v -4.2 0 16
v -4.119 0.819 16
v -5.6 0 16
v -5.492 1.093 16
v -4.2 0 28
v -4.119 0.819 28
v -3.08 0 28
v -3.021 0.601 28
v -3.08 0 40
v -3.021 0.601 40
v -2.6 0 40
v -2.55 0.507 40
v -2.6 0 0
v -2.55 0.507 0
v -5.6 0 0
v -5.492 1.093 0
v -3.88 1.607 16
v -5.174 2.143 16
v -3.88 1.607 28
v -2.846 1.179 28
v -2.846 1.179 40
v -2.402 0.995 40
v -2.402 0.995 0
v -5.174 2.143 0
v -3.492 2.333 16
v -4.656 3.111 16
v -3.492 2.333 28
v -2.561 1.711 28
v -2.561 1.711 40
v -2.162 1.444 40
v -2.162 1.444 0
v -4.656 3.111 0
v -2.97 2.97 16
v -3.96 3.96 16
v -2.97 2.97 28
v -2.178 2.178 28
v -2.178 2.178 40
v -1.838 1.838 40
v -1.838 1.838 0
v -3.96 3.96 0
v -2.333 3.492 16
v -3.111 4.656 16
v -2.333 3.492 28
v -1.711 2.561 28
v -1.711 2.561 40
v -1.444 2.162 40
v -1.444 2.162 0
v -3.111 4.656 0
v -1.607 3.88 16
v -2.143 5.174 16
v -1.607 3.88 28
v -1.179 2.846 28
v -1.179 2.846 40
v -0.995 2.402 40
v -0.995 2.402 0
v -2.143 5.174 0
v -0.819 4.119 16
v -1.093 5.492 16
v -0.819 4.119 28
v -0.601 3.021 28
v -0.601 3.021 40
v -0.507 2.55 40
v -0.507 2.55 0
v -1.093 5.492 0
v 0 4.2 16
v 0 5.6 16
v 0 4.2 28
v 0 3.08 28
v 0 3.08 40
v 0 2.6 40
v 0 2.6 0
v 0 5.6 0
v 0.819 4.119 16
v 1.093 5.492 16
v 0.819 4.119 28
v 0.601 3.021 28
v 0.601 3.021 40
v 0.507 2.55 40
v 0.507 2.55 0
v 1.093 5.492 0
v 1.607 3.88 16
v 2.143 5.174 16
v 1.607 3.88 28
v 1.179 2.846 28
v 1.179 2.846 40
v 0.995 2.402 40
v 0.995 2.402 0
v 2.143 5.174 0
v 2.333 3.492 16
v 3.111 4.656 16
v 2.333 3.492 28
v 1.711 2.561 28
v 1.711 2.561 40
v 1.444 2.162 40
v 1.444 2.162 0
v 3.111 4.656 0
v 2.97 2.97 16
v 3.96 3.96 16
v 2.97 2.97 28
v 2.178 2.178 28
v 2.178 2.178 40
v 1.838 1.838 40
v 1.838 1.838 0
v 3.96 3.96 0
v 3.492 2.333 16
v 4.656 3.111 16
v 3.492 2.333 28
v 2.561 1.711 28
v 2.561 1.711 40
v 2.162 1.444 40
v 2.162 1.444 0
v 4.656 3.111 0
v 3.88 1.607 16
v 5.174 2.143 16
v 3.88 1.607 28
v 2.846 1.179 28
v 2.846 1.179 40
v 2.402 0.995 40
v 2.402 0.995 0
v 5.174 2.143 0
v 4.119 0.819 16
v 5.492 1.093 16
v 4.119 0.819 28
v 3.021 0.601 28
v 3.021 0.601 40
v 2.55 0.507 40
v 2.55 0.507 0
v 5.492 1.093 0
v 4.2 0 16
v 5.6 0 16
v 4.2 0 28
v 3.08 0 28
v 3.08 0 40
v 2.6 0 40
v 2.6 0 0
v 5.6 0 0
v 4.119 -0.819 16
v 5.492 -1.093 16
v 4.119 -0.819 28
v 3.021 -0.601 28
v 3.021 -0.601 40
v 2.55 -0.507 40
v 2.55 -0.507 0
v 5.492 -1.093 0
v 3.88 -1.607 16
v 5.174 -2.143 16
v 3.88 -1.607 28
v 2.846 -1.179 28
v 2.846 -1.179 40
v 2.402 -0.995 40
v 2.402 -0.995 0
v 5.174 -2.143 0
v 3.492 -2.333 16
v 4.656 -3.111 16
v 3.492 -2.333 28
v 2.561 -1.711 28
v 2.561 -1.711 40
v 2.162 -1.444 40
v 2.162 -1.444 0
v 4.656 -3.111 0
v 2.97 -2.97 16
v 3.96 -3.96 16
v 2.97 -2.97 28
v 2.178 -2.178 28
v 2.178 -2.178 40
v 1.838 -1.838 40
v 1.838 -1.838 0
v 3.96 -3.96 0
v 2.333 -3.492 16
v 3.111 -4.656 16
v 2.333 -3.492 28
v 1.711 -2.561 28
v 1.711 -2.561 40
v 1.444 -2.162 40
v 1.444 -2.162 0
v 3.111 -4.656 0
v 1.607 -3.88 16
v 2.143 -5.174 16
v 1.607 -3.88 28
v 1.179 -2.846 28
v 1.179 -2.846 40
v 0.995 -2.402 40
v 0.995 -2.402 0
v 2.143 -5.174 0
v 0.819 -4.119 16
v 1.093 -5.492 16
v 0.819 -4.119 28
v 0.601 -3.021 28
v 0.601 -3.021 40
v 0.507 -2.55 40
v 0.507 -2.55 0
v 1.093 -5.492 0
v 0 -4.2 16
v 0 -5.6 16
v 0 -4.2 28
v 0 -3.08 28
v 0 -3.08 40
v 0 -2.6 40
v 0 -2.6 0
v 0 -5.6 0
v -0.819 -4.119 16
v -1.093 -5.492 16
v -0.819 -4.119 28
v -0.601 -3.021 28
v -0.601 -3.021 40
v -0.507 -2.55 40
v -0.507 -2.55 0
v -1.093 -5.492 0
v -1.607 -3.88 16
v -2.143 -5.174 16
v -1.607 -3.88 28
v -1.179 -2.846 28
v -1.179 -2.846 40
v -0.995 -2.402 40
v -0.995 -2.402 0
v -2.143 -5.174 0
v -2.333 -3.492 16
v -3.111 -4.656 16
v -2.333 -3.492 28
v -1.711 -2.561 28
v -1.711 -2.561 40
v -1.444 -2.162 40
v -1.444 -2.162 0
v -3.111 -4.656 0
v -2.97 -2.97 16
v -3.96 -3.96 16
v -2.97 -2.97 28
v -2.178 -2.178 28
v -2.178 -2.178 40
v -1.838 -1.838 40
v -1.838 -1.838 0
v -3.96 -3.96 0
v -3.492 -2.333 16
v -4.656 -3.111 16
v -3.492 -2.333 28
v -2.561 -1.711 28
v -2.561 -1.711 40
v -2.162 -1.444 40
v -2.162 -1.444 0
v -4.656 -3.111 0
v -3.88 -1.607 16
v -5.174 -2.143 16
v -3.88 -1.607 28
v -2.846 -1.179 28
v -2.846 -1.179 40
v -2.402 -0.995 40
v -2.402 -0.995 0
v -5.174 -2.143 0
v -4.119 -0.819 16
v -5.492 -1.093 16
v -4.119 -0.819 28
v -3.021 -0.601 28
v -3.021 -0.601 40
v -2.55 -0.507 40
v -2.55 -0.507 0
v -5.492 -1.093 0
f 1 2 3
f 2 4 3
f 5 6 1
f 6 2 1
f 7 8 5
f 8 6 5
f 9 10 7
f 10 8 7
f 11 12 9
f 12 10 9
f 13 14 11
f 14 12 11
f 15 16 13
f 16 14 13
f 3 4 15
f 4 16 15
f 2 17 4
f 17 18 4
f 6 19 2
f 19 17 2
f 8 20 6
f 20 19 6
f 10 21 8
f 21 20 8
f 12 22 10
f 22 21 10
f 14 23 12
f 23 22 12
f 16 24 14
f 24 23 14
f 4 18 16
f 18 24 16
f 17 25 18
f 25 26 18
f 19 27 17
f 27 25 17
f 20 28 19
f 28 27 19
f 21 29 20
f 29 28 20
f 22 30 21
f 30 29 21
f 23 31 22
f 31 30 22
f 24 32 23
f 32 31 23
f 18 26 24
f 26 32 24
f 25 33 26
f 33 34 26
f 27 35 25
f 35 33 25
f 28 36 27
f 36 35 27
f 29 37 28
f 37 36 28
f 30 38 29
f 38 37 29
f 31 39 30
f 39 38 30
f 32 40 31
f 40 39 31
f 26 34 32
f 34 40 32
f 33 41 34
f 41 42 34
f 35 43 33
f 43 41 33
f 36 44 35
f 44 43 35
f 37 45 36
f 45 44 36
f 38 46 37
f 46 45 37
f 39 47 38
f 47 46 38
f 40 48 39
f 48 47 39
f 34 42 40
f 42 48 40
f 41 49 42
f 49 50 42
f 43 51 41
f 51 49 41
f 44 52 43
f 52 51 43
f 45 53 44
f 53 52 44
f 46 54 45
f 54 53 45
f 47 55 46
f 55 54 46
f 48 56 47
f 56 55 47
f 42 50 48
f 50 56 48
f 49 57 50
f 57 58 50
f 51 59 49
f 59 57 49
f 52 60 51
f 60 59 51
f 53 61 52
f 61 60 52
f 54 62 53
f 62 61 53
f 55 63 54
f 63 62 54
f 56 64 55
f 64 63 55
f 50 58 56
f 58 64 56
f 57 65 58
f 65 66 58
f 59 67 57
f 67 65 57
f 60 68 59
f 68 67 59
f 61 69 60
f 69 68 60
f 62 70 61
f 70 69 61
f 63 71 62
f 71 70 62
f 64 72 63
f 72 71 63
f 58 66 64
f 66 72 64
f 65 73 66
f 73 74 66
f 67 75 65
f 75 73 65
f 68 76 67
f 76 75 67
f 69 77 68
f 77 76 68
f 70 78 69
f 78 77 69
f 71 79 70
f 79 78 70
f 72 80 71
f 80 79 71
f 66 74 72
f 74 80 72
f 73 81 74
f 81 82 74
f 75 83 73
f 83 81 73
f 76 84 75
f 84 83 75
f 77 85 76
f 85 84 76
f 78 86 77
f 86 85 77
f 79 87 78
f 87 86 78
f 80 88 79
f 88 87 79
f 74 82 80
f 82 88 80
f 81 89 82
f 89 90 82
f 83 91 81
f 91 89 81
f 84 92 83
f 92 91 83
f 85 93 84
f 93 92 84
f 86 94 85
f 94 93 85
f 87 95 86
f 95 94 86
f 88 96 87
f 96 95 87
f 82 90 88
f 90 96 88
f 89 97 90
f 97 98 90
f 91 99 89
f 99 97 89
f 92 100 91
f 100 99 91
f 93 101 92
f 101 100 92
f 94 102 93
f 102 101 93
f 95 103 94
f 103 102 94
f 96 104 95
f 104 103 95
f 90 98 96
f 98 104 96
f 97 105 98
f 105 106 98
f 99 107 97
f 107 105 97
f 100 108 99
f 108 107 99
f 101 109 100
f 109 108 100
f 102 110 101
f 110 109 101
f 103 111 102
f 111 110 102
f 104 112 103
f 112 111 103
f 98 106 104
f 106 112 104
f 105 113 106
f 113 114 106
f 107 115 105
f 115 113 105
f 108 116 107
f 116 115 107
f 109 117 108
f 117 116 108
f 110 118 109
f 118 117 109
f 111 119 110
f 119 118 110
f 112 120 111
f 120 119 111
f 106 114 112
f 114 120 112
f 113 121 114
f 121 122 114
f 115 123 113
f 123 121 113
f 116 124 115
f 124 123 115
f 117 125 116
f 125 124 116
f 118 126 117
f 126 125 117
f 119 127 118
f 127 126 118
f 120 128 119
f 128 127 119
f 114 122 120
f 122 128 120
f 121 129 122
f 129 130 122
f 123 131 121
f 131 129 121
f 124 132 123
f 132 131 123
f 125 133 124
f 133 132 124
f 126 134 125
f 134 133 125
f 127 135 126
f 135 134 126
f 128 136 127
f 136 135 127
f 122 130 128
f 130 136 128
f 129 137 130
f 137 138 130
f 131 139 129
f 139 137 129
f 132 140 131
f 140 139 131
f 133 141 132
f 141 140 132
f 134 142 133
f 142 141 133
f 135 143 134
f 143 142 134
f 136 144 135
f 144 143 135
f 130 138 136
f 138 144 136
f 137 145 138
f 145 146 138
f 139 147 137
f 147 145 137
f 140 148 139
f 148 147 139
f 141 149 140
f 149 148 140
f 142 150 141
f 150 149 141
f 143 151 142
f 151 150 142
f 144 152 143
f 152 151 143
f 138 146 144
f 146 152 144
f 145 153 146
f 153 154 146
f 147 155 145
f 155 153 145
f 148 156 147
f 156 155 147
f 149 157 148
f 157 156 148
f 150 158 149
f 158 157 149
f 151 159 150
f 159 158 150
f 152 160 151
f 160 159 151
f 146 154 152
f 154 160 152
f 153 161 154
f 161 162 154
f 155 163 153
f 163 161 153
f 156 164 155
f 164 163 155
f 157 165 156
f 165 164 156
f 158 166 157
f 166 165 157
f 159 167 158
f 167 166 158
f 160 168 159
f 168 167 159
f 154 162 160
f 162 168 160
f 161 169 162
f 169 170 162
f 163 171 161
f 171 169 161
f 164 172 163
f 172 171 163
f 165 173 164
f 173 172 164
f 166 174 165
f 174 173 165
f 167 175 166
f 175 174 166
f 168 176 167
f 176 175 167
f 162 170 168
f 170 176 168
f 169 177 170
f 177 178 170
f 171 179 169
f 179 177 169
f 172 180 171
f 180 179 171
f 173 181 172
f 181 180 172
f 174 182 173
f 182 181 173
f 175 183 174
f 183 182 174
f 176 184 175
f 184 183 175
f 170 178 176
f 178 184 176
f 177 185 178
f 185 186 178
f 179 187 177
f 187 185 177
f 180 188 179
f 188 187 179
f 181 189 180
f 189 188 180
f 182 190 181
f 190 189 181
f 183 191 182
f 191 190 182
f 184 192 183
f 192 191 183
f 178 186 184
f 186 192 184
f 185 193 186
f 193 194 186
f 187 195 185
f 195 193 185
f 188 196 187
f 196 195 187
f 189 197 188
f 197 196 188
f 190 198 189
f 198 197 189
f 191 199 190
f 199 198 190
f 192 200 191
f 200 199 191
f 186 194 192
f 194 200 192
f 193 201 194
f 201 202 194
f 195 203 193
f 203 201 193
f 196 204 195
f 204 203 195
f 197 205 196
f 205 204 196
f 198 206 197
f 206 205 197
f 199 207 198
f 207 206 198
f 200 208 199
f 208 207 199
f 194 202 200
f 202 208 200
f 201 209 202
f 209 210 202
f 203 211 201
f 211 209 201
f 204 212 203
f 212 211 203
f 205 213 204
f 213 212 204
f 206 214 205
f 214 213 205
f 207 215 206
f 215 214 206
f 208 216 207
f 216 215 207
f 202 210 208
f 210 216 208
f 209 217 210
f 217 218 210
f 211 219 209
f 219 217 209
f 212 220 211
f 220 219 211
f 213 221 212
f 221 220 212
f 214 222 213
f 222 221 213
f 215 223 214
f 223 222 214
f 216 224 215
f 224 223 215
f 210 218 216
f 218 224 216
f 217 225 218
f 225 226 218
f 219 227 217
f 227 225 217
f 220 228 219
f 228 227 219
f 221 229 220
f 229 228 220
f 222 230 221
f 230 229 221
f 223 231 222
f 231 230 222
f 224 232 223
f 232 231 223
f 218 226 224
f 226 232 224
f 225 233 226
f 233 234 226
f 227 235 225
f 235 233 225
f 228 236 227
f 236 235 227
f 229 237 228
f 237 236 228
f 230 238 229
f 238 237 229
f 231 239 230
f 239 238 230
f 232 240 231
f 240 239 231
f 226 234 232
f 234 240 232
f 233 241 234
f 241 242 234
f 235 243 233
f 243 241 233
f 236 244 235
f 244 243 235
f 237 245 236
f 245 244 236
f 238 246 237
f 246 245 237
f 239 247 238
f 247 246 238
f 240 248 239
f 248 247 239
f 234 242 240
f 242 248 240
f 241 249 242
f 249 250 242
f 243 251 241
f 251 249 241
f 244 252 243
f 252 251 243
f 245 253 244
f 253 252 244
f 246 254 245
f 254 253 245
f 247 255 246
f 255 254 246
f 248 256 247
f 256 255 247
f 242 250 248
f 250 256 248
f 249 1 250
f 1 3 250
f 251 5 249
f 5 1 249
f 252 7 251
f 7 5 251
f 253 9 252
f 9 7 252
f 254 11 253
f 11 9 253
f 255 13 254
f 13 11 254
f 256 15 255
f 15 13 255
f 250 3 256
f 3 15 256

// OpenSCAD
$fn = 32;

// ----------------------------------------------------------------------
// Profiled standoff: stepped spacer, 40 mm long, bore 5.2 mm
// ----------------------------------------------------------------------

// --- parameters (mm) ---
revolve_angle = 360;      // full turn around the Z axis
profile_points = 8;       // points of the closed outline

profile = [[2.6, 0], [5.6, 0], [5.6, 16], [4.2, 16], [4.2, 28], [3.08, 28], [3.08, 40], [2.6, 40]];  // single closed polygon, 8 points, counter clockwise

// --- the one profile operation ---
rotate_extrude(angle = revolve_angle) polygon(points = profile);
